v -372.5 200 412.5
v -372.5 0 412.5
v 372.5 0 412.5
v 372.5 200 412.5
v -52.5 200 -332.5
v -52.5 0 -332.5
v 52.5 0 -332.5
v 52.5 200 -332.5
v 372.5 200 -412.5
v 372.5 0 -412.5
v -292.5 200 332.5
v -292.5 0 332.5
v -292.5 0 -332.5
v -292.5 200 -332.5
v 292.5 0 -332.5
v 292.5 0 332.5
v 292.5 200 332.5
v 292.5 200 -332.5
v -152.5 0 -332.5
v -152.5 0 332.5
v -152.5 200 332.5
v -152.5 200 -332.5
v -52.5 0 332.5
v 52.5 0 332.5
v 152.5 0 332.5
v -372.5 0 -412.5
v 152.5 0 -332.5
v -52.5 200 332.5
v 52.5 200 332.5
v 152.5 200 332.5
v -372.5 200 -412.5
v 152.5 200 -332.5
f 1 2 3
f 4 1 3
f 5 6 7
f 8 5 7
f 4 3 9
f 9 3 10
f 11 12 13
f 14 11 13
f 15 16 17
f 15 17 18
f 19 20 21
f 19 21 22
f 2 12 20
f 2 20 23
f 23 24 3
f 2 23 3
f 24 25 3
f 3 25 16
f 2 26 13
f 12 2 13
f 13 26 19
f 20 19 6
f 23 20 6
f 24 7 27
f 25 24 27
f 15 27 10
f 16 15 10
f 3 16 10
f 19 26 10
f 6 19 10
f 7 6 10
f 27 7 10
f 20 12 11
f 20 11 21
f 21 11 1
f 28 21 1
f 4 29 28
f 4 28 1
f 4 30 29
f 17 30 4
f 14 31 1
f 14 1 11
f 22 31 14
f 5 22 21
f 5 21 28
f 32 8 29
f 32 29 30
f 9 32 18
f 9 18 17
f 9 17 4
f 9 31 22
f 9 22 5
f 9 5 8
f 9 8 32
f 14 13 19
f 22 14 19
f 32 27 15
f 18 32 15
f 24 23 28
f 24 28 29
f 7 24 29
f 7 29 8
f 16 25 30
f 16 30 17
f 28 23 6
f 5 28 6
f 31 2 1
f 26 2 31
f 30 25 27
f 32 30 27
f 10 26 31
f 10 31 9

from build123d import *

# Parameters (mm, degrees)
SKETCH1_W           = 745
SKETCH1_H           = 825
SKETCH1_W_2         = 140
SKETCH1_H_2         = 665
SKETCH1_W_3         = 105
BOSS_EXTRUDE1_DEPTH = 200


with BuildPart() as part:
    # Sketch1 → Boss-Extrude1 (new body)
    with BuildSketch(Plane(origin=(0, 0, 0), x_dir=(1, 0, 0), z_dir=(0, 1, 0))):
        Rectangle(SKETCH1_W, SKETCH1_H)
        with Locations((-222.5, 0)):
            Rectangle(SKETCH1_W_2, SKETCH1_H_2, mode=Mode.SUBTRACT)
        with Locations((222.5, 0)):
            Rectangle(SKETCH1_W_2, SKETCH1_H_2, mode=Mode.SUBTRACT)
        Rectangle(SKETCH1_W_3, SKETCH1_H_2, mode=Mode.SUBTRACT)
    extrude(amount=BOSS_EXTRUDE1_DEPTH)


solid = part.part
